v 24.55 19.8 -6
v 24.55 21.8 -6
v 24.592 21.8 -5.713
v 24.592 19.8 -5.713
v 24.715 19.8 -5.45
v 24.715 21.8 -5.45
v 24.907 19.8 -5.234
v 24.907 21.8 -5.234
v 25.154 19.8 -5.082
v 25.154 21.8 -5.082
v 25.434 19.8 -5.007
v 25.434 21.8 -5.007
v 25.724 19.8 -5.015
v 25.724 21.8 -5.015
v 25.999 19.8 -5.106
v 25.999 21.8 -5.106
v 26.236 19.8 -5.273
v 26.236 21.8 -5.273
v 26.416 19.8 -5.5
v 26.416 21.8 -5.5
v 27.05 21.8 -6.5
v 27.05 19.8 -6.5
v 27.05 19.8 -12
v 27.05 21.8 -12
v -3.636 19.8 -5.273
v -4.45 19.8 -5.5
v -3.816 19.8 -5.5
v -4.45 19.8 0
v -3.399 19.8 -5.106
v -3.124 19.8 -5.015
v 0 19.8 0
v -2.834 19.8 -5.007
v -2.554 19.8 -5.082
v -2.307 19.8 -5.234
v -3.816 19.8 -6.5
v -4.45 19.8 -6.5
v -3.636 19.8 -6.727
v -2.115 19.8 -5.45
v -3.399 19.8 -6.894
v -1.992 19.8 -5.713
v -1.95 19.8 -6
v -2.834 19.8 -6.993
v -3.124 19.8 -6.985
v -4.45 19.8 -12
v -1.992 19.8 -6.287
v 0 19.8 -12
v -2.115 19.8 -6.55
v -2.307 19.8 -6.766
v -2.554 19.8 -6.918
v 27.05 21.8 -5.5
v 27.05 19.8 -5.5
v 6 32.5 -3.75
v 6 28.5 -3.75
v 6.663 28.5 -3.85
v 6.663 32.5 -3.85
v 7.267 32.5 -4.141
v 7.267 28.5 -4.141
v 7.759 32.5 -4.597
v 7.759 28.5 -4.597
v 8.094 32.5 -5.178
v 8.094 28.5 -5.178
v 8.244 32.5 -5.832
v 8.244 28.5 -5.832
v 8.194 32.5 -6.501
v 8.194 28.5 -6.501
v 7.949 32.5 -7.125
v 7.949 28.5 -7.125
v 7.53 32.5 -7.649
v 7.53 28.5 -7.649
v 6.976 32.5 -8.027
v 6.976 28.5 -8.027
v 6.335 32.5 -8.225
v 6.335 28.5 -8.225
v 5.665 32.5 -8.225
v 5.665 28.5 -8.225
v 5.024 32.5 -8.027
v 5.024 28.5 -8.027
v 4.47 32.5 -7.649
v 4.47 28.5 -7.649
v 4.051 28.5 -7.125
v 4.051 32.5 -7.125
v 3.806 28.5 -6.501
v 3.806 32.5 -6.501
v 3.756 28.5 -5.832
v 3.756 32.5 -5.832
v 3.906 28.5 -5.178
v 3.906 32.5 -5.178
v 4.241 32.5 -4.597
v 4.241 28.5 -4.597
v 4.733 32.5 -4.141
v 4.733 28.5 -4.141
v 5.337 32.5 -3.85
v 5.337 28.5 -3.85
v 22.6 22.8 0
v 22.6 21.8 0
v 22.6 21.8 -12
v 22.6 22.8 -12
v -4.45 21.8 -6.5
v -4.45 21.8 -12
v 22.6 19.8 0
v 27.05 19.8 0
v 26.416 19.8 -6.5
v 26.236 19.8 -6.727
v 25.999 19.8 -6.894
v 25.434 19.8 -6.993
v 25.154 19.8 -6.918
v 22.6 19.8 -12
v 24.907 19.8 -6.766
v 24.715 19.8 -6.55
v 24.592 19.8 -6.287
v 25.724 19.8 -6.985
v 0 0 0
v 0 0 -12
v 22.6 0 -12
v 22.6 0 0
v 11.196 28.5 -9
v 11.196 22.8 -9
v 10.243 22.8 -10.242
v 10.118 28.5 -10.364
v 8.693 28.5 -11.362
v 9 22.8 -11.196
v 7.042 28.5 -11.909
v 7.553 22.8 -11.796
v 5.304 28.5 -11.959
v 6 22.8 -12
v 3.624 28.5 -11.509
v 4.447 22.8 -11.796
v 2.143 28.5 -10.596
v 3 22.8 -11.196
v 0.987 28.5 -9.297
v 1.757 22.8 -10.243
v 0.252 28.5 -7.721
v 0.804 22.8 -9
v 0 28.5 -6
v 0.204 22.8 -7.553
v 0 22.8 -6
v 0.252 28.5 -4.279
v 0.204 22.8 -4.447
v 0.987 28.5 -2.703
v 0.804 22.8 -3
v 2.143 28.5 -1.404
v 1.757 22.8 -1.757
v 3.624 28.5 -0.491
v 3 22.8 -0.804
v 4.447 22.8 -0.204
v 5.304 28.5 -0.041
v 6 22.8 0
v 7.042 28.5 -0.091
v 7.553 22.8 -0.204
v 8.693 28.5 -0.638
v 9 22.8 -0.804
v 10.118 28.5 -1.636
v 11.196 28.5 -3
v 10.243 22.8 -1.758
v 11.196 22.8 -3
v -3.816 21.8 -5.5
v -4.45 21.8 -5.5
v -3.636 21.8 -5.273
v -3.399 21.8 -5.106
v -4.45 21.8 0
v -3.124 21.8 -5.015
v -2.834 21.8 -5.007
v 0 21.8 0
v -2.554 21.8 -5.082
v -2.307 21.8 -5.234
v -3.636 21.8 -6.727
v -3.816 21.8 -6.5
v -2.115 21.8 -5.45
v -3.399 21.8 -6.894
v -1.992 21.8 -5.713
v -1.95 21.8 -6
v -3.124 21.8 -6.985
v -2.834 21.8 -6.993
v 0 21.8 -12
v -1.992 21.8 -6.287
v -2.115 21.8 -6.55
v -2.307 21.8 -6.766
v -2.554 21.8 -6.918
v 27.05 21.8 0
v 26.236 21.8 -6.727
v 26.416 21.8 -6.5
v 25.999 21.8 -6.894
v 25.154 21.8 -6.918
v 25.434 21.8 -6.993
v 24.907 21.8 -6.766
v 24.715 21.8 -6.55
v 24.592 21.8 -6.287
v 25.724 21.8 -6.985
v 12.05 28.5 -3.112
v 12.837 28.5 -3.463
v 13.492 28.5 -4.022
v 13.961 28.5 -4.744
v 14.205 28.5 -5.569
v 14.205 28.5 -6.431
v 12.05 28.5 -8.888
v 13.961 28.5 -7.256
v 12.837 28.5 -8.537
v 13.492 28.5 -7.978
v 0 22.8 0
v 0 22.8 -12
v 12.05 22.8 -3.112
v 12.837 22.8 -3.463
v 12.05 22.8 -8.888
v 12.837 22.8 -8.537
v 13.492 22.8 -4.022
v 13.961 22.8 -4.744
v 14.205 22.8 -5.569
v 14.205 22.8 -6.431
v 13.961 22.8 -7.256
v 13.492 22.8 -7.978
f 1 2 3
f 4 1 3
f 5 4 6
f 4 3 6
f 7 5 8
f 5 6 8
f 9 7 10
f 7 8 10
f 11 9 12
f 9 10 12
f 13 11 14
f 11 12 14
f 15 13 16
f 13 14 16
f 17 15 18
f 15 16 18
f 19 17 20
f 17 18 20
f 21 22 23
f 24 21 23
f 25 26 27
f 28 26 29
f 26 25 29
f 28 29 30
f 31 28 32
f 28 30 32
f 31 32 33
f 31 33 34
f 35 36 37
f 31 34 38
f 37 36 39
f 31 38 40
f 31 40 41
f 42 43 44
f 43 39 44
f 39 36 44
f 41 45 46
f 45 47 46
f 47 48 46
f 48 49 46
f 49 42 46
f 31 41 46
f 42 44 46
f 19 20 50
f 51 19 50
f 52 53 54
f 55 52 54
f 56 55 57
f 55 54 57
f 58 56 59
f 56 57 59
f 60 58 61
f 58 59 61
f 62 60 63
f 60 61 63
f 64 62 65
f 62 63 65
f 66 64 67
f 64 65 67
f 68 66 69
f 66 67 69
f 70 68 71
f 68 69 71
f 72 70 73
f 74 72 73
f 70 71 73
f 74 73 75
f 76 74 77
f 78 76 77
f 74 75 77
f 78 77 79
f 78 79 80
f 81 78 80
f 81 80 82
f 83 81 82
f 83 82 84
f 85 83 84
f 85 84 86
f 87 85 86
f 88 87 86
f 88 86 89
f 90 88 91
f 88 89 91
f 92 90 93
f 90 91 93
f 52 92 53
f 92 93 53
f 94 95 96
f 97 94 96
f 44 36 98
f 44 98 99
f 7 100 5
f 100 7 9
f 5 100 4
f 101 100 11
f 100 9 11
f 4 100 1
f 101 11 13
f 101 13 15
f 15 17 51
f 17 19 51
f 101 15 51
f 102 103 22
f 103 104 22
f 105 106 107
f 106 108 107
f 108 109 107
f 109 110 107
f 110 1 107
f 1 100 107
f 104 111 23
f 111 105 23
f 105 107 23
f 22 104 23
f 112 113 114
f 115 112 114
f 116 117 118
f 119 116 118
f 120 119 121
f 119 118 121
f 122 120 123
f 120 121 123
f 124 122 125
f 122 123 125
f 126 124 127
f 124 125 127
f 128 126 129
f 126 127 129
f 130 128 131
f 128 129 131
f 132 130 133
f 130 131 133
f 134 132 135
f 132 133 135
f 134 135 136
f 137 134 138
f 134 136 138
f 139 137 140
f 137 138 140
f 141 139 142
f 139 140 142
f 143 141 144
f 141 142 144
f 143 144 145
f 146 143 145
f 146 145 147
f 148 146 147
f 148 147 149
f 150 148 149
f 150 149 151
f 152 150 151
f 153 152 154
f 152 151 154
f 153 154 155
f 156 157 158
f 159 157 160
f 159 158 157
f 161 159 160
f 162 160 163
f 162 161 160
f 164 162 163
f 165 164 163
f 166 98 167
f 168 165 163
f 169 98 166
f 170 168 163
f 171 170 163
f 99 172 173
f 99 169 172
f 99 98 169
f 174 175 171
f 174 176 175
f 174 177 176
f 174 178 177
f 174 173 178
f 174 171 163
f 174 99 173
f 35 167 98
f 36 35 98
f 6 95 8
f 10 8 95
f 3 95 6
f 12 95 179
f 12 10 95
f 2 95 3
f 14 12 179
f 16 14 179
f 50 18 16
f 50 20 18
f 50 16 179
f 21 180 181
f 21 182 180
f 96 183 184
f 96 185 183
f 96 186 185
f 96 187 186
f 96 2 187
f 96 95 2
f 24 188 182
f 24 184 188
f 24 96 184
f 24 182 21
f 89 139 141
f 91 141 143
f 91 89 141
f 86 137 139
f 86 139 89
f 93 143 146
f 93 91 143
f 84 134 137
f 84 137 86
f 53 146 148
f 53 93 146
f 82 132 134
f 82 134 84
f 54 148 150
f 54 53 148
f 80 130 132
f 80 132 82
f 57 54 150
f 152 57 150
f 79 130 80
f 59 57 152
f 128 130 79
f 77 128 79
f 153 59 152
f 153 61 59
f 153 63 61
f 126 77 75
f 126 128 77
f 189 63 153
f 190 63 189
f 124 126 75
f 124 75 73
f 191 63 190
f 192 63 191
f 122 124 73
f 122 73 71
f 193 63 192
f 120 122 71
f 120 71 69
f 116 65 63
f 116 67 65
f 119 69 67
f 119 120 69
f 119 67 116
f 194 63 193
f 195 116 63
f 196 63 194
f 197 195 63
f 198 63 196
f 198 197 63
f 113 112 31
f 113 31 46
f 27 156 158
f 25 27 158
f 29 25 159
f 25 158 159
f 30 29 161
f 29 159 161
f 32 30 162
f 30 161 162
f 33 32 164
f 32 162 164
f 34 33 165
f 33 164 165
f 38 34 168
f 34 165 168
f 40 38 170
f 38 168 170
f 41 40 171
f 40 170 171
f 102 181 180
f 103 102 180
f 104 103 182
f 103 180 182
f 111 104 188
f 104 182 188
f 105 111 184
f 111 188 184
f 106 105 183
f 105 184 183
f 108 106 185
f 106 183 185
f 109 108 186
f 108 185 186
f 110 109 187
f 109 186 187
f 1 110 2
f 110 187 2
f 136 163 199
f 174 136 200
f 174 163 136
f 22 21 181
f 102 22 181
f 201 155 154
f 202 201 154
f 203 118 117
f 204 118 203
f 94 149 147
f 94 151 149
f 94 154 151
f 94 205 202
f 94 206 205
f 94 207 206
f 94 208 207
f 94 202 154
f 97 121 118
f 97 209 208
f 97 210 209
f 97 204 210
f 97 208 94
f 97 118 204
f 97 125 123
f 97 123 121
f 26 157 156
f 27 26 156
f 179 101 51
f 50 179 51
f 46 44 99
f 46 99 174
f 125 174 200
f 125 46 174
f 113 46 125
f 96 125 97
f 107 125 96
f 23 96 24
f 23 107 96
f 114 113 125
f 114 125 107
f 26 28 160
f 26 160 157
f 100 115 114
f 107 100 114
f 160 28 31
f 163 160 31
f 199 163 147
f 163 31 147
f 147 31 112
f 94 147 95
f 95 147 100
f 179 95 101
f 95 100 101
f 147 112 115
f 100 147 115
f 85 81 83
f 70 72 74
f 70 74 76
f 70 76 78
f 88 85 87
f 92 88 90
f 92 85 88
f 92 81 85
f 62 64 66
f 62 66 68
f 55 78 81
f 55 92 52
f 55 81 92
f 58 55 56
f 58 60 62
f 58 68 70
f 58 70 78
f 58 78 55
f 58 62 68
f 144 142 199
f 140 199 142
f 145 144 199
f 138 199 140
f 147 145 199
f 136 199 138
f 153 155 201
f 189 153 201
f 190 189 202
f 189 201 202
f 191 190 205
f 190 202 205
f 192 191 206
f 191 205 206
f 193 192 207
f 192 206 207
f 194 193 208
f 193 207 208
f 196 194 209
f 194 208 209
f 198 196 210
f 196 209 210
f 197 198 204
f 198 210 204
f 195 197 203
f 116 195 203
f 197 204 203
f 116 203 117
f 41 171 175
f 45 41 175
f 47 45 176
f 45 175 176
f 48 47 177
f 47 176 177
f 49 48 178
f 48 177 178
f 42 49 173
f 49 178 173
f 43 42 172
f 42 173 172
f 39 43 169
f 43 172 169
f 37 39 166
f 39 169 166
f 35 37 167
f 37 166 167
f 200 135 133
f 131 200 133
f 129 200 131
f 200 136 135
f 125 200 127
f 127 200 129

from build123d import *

# Parameters (mm, degrees)
SCHIZZO1_W                   = 22.6
SCHIZZO1_H                   = 12
ESTRUSIONE_ESTRUSIONE1_DEPTH = 19.8
SCHIZZO3_W                   = 31.5
SCHIZZO3_H                   = 12
ESTRUSIONE_ESTRUSIONE2_DEPTH = 2
SCHIZZO4_W                   = 22.6
SCHIZZO4_H                   = 12
ESTRUSIONE_ESTRUSIONE3_DEPTH = 1
SCHIZZO5_R                   = 3
SCHIZZO5_R_2                 = 6
ESTRUSIONE_ESTRUSIONE4_DEPTH = 5.7
SCHIZZO6_R                   = 2.25
ESTRUSIONE_ESTRUSIONE5_DEPTH = 4
TAGLIO_ESTRUSIONE2_REACH     = 38.755


with BuildPart() as part:
    # Schizzo1 → Estrusione-Estrusione1 (new body)
    with BuildSketch(Plane(origin=(0, 0, 0), x_dir=(1, 0, 0), z_dir=(0, 1, 0))):
        with Locations((11.3, 6)):
            Rectangle(SCHIZZO1_W, SCHIZZO1_H)
    extrude(amount=ESTRUSIONE_ESTRUSIONE1_DEPTH)

    # Schizzo3 → Estrusione-Estrusione2 (add)
    with BuildSketch(Plane(origin=(0, 19.8, 0), x_dir=(1, 0, 0), z_dir=(0, 1, 0))):
        with Locations((11.3, 6)):
            Rectangle(SCHIZZO3_W, SCHIZZO3_H)
    extrude(amount=ESTRUSIONE_ESTRUSIONE2_DEPTH)

    # Schizzo4 → Estrusione-Estrusione3 (add)
    with BuildSketch(Plane(origin=(0, 21.8, 0), x_dir=(1, 0, 0), z_dir=(0, 1, 0))):
        with Locations((11.3, 6)):
            Rectangle(SCHIZZO4_W, SCHIZZO4_H)
    extrude(amount=ESTRUSIONE_ESTRUSIONE3_DEPTH)

    # Schizzo5 → Estrusione-Estrusione4 (add)
    with BuildSketch(Plane(origin=(0, 22.8, 0), x_dir=(1, 0, 0), z_dir=(0, 1, 0))):
        with Locations((11.236395356, 6)):
            Circle(SCHIZZO5_R)
        with Locations((6, 6)):
            Circle(SCHIZZO5_R_2)
    extrude(amount=ESTRUSIONE_ESTRUSIONE4_DEPTH)

    # Schizzo6 → Estrusione-Estrusione5 (add)
    with BuildSketch(Plane(origin=(0, 28.5, 0), x_dir=(1, 0, 0), z_dir=(0, 1, 0))):
        with Locations(Location((6, 6, 0), (0, 0, 270))):
            Circle(SCHIZZO6_R)
    extrude(amount=ESTRUSIONE_ESTRUSIONE5_DEPTH)

    # Schizzo7 → Taglio-Estrusione2 (cut, up to next)
    with BuildSketch(Plane(origin=(0, 21.8, 0), x_dir=(1, 0, 0), z_dir=(0, 1, 0)), mode=Mode.PRIVATE) as taglio_estrusione2_sk1:
        with BuildLine():
            Line((-4.45, 5.5), (-3.816025404, 5.5))
            ThreePointArc((-3.816025404, 5.5), (-3.915925826, 5.741180955), (-3.95, 6))
            Line((-3.95, 6), (-4.45, 6))
            Line((-4.45, 6), (-4.45, 5.5))
        make_face()
    taglio_estrusione2_tool1 = extrude(taglio_estrusione2_sk1.sketch, amount=-TAGLIO_ESTRUSIONE2_REACH, mode=Mode.PRIVATE) & part.part
    # Schizzo7 → Taglio-Estrusione2 (cut, up to next)
    with BuildSketch(Plane(origin=(0, 21.8, 0), x_dir=(1, 0, 0), z_dir=(0, 1, 0)), mode=Mode.PRIVATE) as taglio_estrusione2_sk2:
        with BuildLine():
            ThreePointArc((-3.95, 6), (-3.915925826, 6.258819045), (-3.816025404, 6.5))
            Line((-3.816025404, 6.5), (-4.45, 6.5))
            Line((-4.45, 6.5), (-4.45, 6))
            Line((-4.45, 6), (-3.95, 6))
        make_face()
    taglio_estrusione2_tool2 = extrude(taglio_estrusione2_sk2.sketch, amount=-TAGLIO_ESTRUSIONE2_REACH, mode=Mode.PRIVATE) & part.part
    # Schizzo7 → Taglio-Estrusione2 (cut, up to next)
    with BuildSketch(Plane(origin=(0, 21.8, 0), x_dir=(1, 0, 0), z_dir=(0, 1, 0)), mode=Mode.PRIVATE) as taglio_estrusione2_sk3:
        with BuildLine():
            ThreePointArc((-3.816025404, 5.5), (-2.691180955, 5.034074174), (-1.95, 6))
            Line((-1.95, 6), (-2.449082486, 6))
            Line((-2.449082486, 6), (-2.449082486, 5.5))
            Line((-2.449082486, 5.5), (-3.816025404, 5.5))
        make_face()
    taglio_estrusione2_tool3 = extrude(taglio_estrusione2_sk3.sketch, amount=-TAGLIO_ESTRUSIONE2_REACH, mode=Mode.PRIVATE) & part.part
    # Schizzo7 → Taglio-Estrusione2 (cut, up to next)
    with BuildSketch(Plane(origin=(0, 21.8, 0), x_dir=(1, 0, 0), z_dir=(0, 1, 0)), mode=Mode.PRIVATE) as taglio_estrusione2_sk4:
        with BuildLine():
            Line((-2.449082486, 5.5), (-2.449082486, 6))
            Line((-2.449082486, 6), (-3.95, 6))
            ThreePointArc((-3.95, 6), (-3.915925826, 5.741180955), (-3.816025404, 5.5))
            Line((-3.816025404, 5.5), (-2.449082486, 5.5))
        make_face()
    taglio_estrusione2_tool4 = extrude(taglio_estrusione2_sk4.sketch, amount=-TAGLIO_ESTRUSIONE2_REACH, mode=Mode.PRIVATE) & part.part
    # Schizzo7 → Taglio-Estrusione2 (cut, up to next)
    with BuildSketch(Plane(origin=(0, 21.8, 0), x_dir=(1, 0, 0), z_dir=(0, 1, 0)), mode=Mode.PRIVATE) as taglio_estrusione2_sk5:
        with BuildLine():
            Line((-2.449082486, 6), (-1.95, 6))
            ThreePointArc((-1.95, 6), (-2.691180955, 6.965925826), (-3.816025404, 6.5))
            Line((-3.816025404, 6.5), (-2.449082486, 6.5))
            Line((-2.449082486, 6.5), (-2.449082486, 6))
        make_face()
    taglio_estrusione2_tool5 = extrude(taglio_estrusione2_sk5.sketch, amount=-TAGLIO_ESTRUSIONE2_REACH, mode=Mode.PRIVATE) & part.part
    # Schizzo7 → Taglio-Estrusione2 (cut, up to next)
    with BuildSketch(Plane(origin=(0, 21.8, 0), x_dir=(1, 0, 0), z_dir=(0, 1, 0)), mode=Mode.PRIVATE) as taglio_estrusione2_sk6:
        with BuildLine():
            Line((-3.95, 6), (-2.449082486, 6))
            Line((-2.449082486, 6), (-2.449082486, 6.5))
            Line((-2.449082486, 6.5), (-3.816025404, 6.5))
            ThreePointArc((-3.816025404, 6.5), (-3.915925826, 6.258819045), (-3.95, 6))
        make_face()
    taglio_estrusione2_tool6 = extrude(taglio_estrusione2_sk6.sketch, amount=-TAGLIO_ESTRUSIONE2_REACH, mode=Mode.PRIVATE) & part.part
    # Schizzo7 → Taglio-Estrusione2 (cut, up to next)
    with BuildSketch(Plane(origin=(0, 21.8, 0), x_dir=(1, 0, 0), z_dir=(0, 1, 0)), mode=Mode.PRIVATE) as taglio_estrusione2_sk7:
        with BuildLine():
            ThreePointArc((-3.816025404, 5.5), (-2.691180955, 5.034074174), (-1.95, 6))
            Line((-1.95, 6), (-2.449082486, 6))
            Line((-2.449082486, 6), (-2.449082486, 5.5))
            Line((-2.449082486, 5.5), (-3.816025404, 5.5))
        make_face()
    taglio_estrusione2_tool7 = extrude(taglio_estrusione2_sk7.sketch, amount=-TAGLIO_ESTRUSIONE2_REACH, mode=Mode.PRIVATE) & part.part
    # Schizzo7 → Taglio-Estrusione2 (cut, up to next)
    with BuildSketch(Plane(origin=(0, 21.8, 0), x_dir=(1, 0, 0), z_dir=(0, 1, 0)), mode=Mode.PRIVATE) as taglio_estrusione2_sk8:
        with BuildLine():
            Line((-2.449082486, 5.5), (-2.449082486, 6))
            Line((-2.449082486, 6), (-3.95, 6))
            ThreePointArc((-3.95, 6), (-3.915925826, 5.741180955), (-3.816025404, 5.5))
            Line((-3.816025404, 5.5), (-2.449082486, 5.5))
        make_face()
    taglio_estrusione2_tool8 = extrude(taglio_estrusione2_sk8.sketch, amount=-TAGLIO_ESTRUSIONE2_REACH, mode=Mode.PRIVATE) & part.part
    # Schizzo7 → Taglio-Estrusione2 (cut, up to next)
    with BuildSketch(Plane(origin=(0, 21.8, 0), x_dir=(1, 0, 0), z_dir=(0, 1, 0)), mode=Mode.PRIVATE) as taglio_estrusione2_sk9:
        with BuildLine():
            Line((-2.449082486, 6), (-1.95, 6))
            ThreePointArc((-1.95, 6), (-2.691180955, 6.965925826), (-3.816025404, 6.5))
            Line((-3.816025404, 6.5), (-2.449082486, 6.5))
            Line((-2.449082486, 6.5), (-2.449082486, 6))
        make_face()
    taglio_estrusione2_tool9 = extrude(taglio_estrusione2_sk9.sketch, amount=-TAGLIO_ESTRUSIONE2_REACH, mode=Mode.PRIVATE) & part.part
    # Schizzo7 → Taglio-Estrusione2 (cut, up to next)
    with BuildSketch(Plane(origin=(0, 21.8, 0), x_dir=(1, 0, 0), z_dir=(0, 1, 0)), mode=Mode.PRIVATE) as taglio_estrusione2_sk10:
        with BuildLine():
            Line((-3.95, 6), (-2.449082486, 6))
            Line((-2.449082486, 6), (-2.449082486, 6.5))
            Line((-2.449082486, 6.5), (-3.816025404, 6.5))
            ThreePointArc((-3.816025404, 6.5), (-3.915925826, 6.258819045), (-3.95, 6))
        make_face()
    taglio_estrusione2_tool10 = extrude(taglio_estrusione2_sk10.sketch, amount=-TAGLIO_ESTRUSIONE2_REACH, mode=Mode.PRIVATE) & part.part
    # Schizzo7 → Taglio-Estrusione2 (cut, up to next)
    with BuildSketch(Plane(origin=(0, 21.8, 0), x_dir=(1, 0, 0), z_dir=(0, 1, 0)), mode=Mode.PRIVATE) as taglio_estrusione2_sk11:
        with BuildLine():
            ThreePointArc((26.416025404, 5.5), (26.515925826, 5.741180955), (26.55, 6))
            Line((26.55, 6), (25.047557224, 6))
            Line((25.047557224, 6), (25.047557224, 5.5))
            Line((25.047557224, 5.5), (26.416025404, 5.5))
        make_face()
    taglio_estrusione2_tool11 = extrude(taglio_estrusione2_sk11.sketch, amount=-TAGLIO_ESTRUSIONE2_REACH, mode=Mode.PRIVATE) & part.part
    # Schizzo7 → Taglio-Estrusione2 (cut, up to next)
    with BuildSketch(Plane(origin=(0, 21.8, 0), x_dir=(1, 0, 0), z_dir=(0, 1, 0)), mode=Mode.PRIVATE) as taglio_estrusione2_sk12:
        with BuildLine():
            Line((25.047557224, 5.5), (25.047557224, 6))
            Line((25.047557224, 6), (24.55, 6))
            ThreePointArc((24.55, 6), (25.291180955, 5.034074174), (26.416025404, 5.5))
            Line((26.416025404, 5.5), (25.047557224, 5.5))
        make_face()
    taglio_estrusione2_tool12 = extrude(taglio_estrusione2_sk12.sketch, amount=-TAGLIO_ESTRUSIONE2_REACH, mode=Mode.PRIVATE) & part.part
    # Schizzo7 → Taglio-Estrusione2 (cut, up to next)
    with BuildSketch(Plane(origin=(0, 21.8, 0), x_dir=(1, 0, 0), z_dir=(0, 1, 0)), mode=Mode.PRIVATE) as taglio_estrusione2_sk13:
        with BuildLine():
            ThreePointArc((26.416025404, 5.5), (26.515925826, 5.741180955), (26.55, 6))
            Line((26.55, 6), (25.047557224, 6))
            Line((25.047557224, 6), (25.047557224, 5.5))
            Line((25.047557224, 5.5), (26.416025404, 5.5))
        make_face()
    taglio_estrusione2_tool13 = extrude(taglio_estrusione2_sk13.sketch, amount=-TAGLIO_ESTRUSIONE2_REACH, mode=Mode.PRIVATE) & part.part
    # Schizzo7 → Taglio-Estrusione2 (cut, up to next)
    with BuildSketch(Plane(origin=(0, 21.8, 0), x_dir=(1, 0, 0), z_dir=(0, 1, 0)), mode=Mode.PRIVATE) as taglio_estrusione2_sk14:
        with BuildLine():
            Line((25.047557224, 5.5), (25.047557224, 6))
            Line((25.047557224, 6), (24.55, 6))
            ThreePointArc((24.55, 6), (25.291180955, 5.034074174), (26.416025404, 5.5))
            Line((26.416025404, 5.5), (25.047557224, 5.5))
        make_face()
    taglio_estrusione2_tool14 = extrude(taglio_estrusione2_sk14.sketch, amount=-TAGLIO_ESTRUSIONE2_REACH, mode=Mode.PRIVATE) & part.part
    # Schizzo7 → Taglio-Estrusione2 (cut, up to next)
    with BuildSketch(Plane(origin=(0, 21.8, 0), x_dir=(1, 0, 0), z_dir=(0, 1, 0)), mode=Mode.PRIVATE) as taglio_estrusione2_sk15:
        with BuildLine():
            Line((25.047557224, 6), (26.55, 6))
            ThreePointArc((26.55, 6), (26.515925826, 6.258819045), (26.416025404, 6.5))
            Line((26.416025404, 6.5), (25.047557224, 6.5))
            Line((25.047557224, 6.5), (25.047557224, 6))
        make_face()
    taglio_estrusione2_tool15 = extrude(taglio_estrusione2_sk15.sketch, amount=-TAGLIO_ESTRUSIONE2_REACH, mode=Mode.PRIVATE) & part.part
    # Schizzo7 → Taglio-Estrusione2 (cut, up to next)
    with BuildSketch(Plane(origin=(0, 21.8, 0), x_dir=(1, 0, 0), z_dir=(0, 1, 0)), mode=Mode.PRIVATE) as taglio_estrusione2_sk16:
        with BuildLine():
            Line((24.55, 6), (25.047557224, 6))
            Line((25.047557224, 6), (25.047557224, 6.5))
            Line((25.047557224, 6.5), (26.416025404, 6.5))
            ThreePointArc((26.416025404, 6.5), (25.291180955, 6.965925826), (24.55, 6))
        make_face()
    taglio_estrusione2_tool16 = extrude(taglio_estrusione2_sk16.sketch, amount=-TAGLIO_ESTRUSIONE2_REACH, mode=Mode.PRIVATE) & part.part
    # Schizzo7 → Taglio-Estrusione2 (cut, up to next)
    with BuildSketch(Plane(origin=(0, 21.8, 0), x_dir=(1, 0, 0), z_dir=(0, 1, 0)), mode=Mode.PRIVATE) as taglio_estrusione2_sk17:
        with BuildLine():
            Line((25.047557224, 6), (26.55, 6))
            ThreePointArc((26.55, 6), (26.515925826, 6.258819045), (26.416025404, 6.5))
            Line((26.416025404, 6.5), (25.047557224, 6.5))
            Line((25.047557224, 6.5), (25.047557224, 6))
        make_face()
    taglio_estrusione2_tool17 = extrude(taglio_estrusione2_sk17.sketch, amount=-TAGLIO_ESTRUSIONE2_REACH, mode=Mode.PRIVATE) & part.part
    # Schizzo7 → Taglio-Estrusione2 (cut, up to next)
    with BuildSketch(Plane(origin=(0, 21.8, 0), x_dir=(1, 0, 0), z_dir=(0, 1, 0)), mode=Mode.PRIVATE) as taglio_estrusione2_sk18:
        with BuildLine():
            Line((24.55, 6), (25.047557224, 6))
            Line((25.047557224, 6), (25.047557224, 6.5))
            Line((25.047557224, 6.5), (26.416025404, 6.5))
            ThreePointArc((26.416025404, 6.5), (25.291180955, 6.965925826), (24.55, 6))
        make_face()
    taglio_estrusione2_tool18 = extrude(taglio_estrusione2_sk18.sketch, amount=-TAGLIO_ESTRUSIONE2_REACH, mode=Mode.PRIVATE) & part.part
    # Schizzo7 → Taglio-Estrusione2 (cut, up to next)
    with BuildSketch(Plane(origin=(0, 21.8, 0), x_dir=(1, 0, 0), z_dir=(0, 1, 0)), mode=Mode.PRIVATE) as taglio_estrusione2_sk19:
        with BuildLine():
            Line((26.55, 6), (27.05, 6))
            Line((27.05, 6), (27.05, 6.5))
            Line((27.05, 6.5), (26.416025404, 6.5))
            ThreePointArc((26.416025404, 6.5), (26.515925826, 6.258819045), (26.55, 6))
        make_face()
    taglio_estrusione2_tool19 = extrude(taglio_estrusione2_sk19.sketch, amount=-TAGLIO_ESTRUSIONE2_REACH, mode=Mode.PRIVATE) & part.part
    # Schizzo7 → Taglio-Estrusione2 (cut, up to next)
    with BuildSketch(Plane(origin=(0, 21.8, 0), x_dir=(1, 0, 0), z_dir=(0, 1, 0)), mode=Mode.PRIVATE) as taglio_estrusione2_sk20:
        with BuildLine():
            Line((27.05, 5.5), (27.05, 6))
            Line((27.05, 6), (26.55, 6))
            ThreePointArc((26.55, 6), (26.515925826, 5.741180955), (26.416025404, 5.5))
            Line((26.416025404, 5.5), (27.05, 5.5))
        make_face()
    taglio_estrusione2_tool20 = extrude(taglio_estrusione2_sk20.sketch, amount=-TAGLIO_ESTRUSIONE2_REACH, mode=Mode.PRIVATE) & part.part
    add(taglio_estrusione2_tool1.solids().sort_by_distance((-4.176869, 21.8, -5.73988))[0], mode=Mode.SUBTRACT)
    add(taglio_estrusione2_tool2.solids().sort_by_distance((-4.176869, 21.8, -6.26012))[0], mode=Mode.SUBTRACT)
    add(taglio_estrusione2_tool3.solids().sort_by_distance((-2.752339, 21.8, -5.42137))[0], mode=Mode.SUBTRACT)
    add(taglio_estrusione2_tool4.solids().sort_by_distance((-3.178383, 21.8, -5.753773))[0], mode=Mode.SUBTRACT)
    add(taglio_estrusione2_tool5.solids().sort_by_distance((-2.752339, 21.8, -6.57863))[0], mode=Mode.SUBTRACT)
    add(taglio_estrusione2_tool6.solids().sort_by_distance((-3.178383, 21.8, -6.246227))[0], mode=Mode.SUBTRACT)
    add(taglio_estrusione2_tool7.solids().sort_by_distance((-2.752339, 21.8, -5.42137))[0], mode=Mode.SUBTRACT)
    add(taglio_estrusione2_tool8.solids().sort_by_distance((-3.178383, 21.8, -5.753773))[0], mode=Mode.SUBTRACT)
    add(taglio_estrusione2_tool9.solids().sort_by_distance((-2.752339, 21.8, -6.57863))[0], mode=Mode.SUBTRACT)
    add(taglio_estrusione2_tool10.solids().sort_by_distance((-3.178383, 21.8, -6.246227))[0], mode=Mode.SUBTRACT)
    add(taglio_estrusione2_tool11.solids().sort_by_distance((25.777619, 21.8, -5.753769))[0], mode=Mode.SUBTRACT)
    add(taglio_estrusione2_tool12.solids().sort_by_distance((25.352614, 21.8, -5.421072))[0], mode=Mode.SUBTRACT)
    add(taglio_estrusione2_tool13.solids().sort_by_distance((25.777619, 21.8, -5.753769))[0], mode=Mode.SUBTRACT)
    add(taglio_estrusione2_tool14.solids().sort_by_distance((25.352614, 21.8, -5.421072))[0], mode=Mode.SUBTRACT)
    add(taglio_estrusione2_tool15.solids().sort_by_distance((25.777619, 21.8, -6.246231))[0], mode=Mode.SUBTRACT)
    add(taglio_estrusione2_tool16.solids().sort_by_distance((25.352614, 21.8, -6.578928))[0], mode=Mode.SUBTRACT)
    add(taglio_estrusione2_tool17.solids().sort_by_distance((25.777619, 21.8, -6.246231))[0], mode=Mode.SUBTRACT)
    add(taglio_estrusione2_tool18.solids().sort_by_distance((25.352614, 21.8, -6.578928))[0], mode=Mode.SUBTRACT)
    add(taglio_estrusione2_tool19.solids().sort_by_distance((26.776869, 21.8, -6.26012))[0], mode=Mode.SUBTRACT)
    add(taglio_estrusione2_tool20.solids().sort_by_distance((26.776869, 21.8, -5.73988))[0], mode=Mode.SUBTRACT)


solid = part.part
